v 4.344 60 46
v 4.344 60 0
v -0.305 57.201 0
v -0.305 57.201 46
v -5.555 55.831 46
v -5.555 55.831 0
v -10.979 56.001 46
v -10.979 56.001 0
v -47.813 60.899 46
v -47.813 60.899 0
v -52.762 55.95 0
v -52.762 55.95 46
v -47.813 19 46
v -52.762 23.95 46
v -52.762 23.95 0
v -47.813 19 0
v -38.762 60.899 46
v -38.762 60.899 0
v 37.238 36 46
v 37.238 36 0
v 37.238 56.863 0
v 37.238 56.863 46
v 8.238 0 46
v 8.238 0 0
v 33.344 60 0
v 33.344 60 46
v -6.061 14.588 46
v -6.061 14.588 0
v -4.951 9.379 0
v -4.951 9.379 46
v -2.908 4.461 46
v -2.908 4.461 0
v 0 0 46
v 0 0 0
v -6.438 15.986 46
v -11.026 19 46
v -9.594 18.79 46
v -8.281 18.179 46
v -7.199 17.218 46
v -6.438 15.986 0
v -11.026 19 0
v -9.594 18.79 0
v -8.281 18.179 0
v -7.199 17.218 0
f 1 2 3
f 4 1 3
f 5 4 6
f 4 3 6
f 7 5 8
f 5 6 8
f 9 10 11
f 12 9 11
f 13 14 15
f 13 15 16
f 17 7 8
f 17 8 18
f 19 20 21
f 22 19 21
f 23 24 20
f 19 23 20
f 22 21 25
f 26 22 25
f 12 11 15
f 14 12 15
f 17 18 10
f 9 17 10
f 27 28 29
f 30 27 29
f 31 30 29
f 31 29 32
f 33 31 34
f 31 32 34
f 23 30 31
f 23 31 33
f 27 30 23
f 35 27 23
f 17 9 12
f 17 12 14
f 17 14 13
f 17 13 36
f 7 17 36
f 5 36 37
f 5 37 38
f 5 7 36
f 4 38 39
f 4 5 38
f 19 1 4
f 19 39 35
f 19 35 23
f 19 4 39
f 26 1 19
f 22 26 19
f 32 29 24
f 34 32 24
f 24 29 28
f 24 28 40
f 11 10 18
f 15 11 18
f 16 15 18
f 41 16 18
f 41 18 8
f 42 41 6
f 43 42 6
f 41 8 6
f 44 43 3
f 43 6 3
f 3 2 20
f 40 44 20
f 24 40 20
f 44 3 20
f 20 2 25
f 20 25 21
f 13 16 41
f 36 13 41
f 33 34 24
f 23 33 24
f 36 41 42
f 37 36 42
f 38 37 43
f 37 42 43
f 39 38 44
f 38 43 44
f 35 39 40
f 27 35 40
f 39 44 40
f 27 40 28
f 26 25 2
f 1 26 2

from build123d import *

# Parameters (mm, degrees)
DODANIE_WYCI_GNI_CIE1_DEPTH = 46


with BuildPart() as part:
    # Szkic1 → Dodanie-wyciągnięcie1 (new body)
    with BuildSketch(Plane.XY):
        with BuildLine():
            Line((0, 0), (8.237634002, 0))
            Line((8.237634002, 0), (37.237634002, 36))
            Line((37.237634002, 36), (37.237634002, 56.863352311))
            Line((37.237634002, 56.863352311), (33.343864456, 60))
            Line((33.343864456, 60), (4.343864456, 60))
            ThreePointArc((4.343864456, 60), (-2.880934736, 56.327791154), (-10.978818754, 56.000505938))
            Line((-10.978818754, 56.000505938), (-38.762365998, 60.899494937))
            Line((-38.762365998, 60.899494937), (-47.81261853, 60.899494937))
            Line((-47.81261853, 60.899494937), (-52.762365998, 55.949747468))
            Line((-52.762365998, 55.949747468), (-52.762365998, 23.949747468))
            Line((-52.762365998, 23.949747468), (-47.81261853, 19))
            Line((-47.81261853, 19), (-11.02625203, 19))
            ThreePointArc((-11.02625203, 19), (-7.70519621, 17.737725008), (-6.060974673, 14.588235294))
            ThreePointArc((-6.060974673, 14.588235294), (-4.04296027, 6.873465479), (0, 0))
        make_face()
    extrude(amount=DODANIE_WYCI_GNI_CIE1_DEPTH)


solid = part.part
